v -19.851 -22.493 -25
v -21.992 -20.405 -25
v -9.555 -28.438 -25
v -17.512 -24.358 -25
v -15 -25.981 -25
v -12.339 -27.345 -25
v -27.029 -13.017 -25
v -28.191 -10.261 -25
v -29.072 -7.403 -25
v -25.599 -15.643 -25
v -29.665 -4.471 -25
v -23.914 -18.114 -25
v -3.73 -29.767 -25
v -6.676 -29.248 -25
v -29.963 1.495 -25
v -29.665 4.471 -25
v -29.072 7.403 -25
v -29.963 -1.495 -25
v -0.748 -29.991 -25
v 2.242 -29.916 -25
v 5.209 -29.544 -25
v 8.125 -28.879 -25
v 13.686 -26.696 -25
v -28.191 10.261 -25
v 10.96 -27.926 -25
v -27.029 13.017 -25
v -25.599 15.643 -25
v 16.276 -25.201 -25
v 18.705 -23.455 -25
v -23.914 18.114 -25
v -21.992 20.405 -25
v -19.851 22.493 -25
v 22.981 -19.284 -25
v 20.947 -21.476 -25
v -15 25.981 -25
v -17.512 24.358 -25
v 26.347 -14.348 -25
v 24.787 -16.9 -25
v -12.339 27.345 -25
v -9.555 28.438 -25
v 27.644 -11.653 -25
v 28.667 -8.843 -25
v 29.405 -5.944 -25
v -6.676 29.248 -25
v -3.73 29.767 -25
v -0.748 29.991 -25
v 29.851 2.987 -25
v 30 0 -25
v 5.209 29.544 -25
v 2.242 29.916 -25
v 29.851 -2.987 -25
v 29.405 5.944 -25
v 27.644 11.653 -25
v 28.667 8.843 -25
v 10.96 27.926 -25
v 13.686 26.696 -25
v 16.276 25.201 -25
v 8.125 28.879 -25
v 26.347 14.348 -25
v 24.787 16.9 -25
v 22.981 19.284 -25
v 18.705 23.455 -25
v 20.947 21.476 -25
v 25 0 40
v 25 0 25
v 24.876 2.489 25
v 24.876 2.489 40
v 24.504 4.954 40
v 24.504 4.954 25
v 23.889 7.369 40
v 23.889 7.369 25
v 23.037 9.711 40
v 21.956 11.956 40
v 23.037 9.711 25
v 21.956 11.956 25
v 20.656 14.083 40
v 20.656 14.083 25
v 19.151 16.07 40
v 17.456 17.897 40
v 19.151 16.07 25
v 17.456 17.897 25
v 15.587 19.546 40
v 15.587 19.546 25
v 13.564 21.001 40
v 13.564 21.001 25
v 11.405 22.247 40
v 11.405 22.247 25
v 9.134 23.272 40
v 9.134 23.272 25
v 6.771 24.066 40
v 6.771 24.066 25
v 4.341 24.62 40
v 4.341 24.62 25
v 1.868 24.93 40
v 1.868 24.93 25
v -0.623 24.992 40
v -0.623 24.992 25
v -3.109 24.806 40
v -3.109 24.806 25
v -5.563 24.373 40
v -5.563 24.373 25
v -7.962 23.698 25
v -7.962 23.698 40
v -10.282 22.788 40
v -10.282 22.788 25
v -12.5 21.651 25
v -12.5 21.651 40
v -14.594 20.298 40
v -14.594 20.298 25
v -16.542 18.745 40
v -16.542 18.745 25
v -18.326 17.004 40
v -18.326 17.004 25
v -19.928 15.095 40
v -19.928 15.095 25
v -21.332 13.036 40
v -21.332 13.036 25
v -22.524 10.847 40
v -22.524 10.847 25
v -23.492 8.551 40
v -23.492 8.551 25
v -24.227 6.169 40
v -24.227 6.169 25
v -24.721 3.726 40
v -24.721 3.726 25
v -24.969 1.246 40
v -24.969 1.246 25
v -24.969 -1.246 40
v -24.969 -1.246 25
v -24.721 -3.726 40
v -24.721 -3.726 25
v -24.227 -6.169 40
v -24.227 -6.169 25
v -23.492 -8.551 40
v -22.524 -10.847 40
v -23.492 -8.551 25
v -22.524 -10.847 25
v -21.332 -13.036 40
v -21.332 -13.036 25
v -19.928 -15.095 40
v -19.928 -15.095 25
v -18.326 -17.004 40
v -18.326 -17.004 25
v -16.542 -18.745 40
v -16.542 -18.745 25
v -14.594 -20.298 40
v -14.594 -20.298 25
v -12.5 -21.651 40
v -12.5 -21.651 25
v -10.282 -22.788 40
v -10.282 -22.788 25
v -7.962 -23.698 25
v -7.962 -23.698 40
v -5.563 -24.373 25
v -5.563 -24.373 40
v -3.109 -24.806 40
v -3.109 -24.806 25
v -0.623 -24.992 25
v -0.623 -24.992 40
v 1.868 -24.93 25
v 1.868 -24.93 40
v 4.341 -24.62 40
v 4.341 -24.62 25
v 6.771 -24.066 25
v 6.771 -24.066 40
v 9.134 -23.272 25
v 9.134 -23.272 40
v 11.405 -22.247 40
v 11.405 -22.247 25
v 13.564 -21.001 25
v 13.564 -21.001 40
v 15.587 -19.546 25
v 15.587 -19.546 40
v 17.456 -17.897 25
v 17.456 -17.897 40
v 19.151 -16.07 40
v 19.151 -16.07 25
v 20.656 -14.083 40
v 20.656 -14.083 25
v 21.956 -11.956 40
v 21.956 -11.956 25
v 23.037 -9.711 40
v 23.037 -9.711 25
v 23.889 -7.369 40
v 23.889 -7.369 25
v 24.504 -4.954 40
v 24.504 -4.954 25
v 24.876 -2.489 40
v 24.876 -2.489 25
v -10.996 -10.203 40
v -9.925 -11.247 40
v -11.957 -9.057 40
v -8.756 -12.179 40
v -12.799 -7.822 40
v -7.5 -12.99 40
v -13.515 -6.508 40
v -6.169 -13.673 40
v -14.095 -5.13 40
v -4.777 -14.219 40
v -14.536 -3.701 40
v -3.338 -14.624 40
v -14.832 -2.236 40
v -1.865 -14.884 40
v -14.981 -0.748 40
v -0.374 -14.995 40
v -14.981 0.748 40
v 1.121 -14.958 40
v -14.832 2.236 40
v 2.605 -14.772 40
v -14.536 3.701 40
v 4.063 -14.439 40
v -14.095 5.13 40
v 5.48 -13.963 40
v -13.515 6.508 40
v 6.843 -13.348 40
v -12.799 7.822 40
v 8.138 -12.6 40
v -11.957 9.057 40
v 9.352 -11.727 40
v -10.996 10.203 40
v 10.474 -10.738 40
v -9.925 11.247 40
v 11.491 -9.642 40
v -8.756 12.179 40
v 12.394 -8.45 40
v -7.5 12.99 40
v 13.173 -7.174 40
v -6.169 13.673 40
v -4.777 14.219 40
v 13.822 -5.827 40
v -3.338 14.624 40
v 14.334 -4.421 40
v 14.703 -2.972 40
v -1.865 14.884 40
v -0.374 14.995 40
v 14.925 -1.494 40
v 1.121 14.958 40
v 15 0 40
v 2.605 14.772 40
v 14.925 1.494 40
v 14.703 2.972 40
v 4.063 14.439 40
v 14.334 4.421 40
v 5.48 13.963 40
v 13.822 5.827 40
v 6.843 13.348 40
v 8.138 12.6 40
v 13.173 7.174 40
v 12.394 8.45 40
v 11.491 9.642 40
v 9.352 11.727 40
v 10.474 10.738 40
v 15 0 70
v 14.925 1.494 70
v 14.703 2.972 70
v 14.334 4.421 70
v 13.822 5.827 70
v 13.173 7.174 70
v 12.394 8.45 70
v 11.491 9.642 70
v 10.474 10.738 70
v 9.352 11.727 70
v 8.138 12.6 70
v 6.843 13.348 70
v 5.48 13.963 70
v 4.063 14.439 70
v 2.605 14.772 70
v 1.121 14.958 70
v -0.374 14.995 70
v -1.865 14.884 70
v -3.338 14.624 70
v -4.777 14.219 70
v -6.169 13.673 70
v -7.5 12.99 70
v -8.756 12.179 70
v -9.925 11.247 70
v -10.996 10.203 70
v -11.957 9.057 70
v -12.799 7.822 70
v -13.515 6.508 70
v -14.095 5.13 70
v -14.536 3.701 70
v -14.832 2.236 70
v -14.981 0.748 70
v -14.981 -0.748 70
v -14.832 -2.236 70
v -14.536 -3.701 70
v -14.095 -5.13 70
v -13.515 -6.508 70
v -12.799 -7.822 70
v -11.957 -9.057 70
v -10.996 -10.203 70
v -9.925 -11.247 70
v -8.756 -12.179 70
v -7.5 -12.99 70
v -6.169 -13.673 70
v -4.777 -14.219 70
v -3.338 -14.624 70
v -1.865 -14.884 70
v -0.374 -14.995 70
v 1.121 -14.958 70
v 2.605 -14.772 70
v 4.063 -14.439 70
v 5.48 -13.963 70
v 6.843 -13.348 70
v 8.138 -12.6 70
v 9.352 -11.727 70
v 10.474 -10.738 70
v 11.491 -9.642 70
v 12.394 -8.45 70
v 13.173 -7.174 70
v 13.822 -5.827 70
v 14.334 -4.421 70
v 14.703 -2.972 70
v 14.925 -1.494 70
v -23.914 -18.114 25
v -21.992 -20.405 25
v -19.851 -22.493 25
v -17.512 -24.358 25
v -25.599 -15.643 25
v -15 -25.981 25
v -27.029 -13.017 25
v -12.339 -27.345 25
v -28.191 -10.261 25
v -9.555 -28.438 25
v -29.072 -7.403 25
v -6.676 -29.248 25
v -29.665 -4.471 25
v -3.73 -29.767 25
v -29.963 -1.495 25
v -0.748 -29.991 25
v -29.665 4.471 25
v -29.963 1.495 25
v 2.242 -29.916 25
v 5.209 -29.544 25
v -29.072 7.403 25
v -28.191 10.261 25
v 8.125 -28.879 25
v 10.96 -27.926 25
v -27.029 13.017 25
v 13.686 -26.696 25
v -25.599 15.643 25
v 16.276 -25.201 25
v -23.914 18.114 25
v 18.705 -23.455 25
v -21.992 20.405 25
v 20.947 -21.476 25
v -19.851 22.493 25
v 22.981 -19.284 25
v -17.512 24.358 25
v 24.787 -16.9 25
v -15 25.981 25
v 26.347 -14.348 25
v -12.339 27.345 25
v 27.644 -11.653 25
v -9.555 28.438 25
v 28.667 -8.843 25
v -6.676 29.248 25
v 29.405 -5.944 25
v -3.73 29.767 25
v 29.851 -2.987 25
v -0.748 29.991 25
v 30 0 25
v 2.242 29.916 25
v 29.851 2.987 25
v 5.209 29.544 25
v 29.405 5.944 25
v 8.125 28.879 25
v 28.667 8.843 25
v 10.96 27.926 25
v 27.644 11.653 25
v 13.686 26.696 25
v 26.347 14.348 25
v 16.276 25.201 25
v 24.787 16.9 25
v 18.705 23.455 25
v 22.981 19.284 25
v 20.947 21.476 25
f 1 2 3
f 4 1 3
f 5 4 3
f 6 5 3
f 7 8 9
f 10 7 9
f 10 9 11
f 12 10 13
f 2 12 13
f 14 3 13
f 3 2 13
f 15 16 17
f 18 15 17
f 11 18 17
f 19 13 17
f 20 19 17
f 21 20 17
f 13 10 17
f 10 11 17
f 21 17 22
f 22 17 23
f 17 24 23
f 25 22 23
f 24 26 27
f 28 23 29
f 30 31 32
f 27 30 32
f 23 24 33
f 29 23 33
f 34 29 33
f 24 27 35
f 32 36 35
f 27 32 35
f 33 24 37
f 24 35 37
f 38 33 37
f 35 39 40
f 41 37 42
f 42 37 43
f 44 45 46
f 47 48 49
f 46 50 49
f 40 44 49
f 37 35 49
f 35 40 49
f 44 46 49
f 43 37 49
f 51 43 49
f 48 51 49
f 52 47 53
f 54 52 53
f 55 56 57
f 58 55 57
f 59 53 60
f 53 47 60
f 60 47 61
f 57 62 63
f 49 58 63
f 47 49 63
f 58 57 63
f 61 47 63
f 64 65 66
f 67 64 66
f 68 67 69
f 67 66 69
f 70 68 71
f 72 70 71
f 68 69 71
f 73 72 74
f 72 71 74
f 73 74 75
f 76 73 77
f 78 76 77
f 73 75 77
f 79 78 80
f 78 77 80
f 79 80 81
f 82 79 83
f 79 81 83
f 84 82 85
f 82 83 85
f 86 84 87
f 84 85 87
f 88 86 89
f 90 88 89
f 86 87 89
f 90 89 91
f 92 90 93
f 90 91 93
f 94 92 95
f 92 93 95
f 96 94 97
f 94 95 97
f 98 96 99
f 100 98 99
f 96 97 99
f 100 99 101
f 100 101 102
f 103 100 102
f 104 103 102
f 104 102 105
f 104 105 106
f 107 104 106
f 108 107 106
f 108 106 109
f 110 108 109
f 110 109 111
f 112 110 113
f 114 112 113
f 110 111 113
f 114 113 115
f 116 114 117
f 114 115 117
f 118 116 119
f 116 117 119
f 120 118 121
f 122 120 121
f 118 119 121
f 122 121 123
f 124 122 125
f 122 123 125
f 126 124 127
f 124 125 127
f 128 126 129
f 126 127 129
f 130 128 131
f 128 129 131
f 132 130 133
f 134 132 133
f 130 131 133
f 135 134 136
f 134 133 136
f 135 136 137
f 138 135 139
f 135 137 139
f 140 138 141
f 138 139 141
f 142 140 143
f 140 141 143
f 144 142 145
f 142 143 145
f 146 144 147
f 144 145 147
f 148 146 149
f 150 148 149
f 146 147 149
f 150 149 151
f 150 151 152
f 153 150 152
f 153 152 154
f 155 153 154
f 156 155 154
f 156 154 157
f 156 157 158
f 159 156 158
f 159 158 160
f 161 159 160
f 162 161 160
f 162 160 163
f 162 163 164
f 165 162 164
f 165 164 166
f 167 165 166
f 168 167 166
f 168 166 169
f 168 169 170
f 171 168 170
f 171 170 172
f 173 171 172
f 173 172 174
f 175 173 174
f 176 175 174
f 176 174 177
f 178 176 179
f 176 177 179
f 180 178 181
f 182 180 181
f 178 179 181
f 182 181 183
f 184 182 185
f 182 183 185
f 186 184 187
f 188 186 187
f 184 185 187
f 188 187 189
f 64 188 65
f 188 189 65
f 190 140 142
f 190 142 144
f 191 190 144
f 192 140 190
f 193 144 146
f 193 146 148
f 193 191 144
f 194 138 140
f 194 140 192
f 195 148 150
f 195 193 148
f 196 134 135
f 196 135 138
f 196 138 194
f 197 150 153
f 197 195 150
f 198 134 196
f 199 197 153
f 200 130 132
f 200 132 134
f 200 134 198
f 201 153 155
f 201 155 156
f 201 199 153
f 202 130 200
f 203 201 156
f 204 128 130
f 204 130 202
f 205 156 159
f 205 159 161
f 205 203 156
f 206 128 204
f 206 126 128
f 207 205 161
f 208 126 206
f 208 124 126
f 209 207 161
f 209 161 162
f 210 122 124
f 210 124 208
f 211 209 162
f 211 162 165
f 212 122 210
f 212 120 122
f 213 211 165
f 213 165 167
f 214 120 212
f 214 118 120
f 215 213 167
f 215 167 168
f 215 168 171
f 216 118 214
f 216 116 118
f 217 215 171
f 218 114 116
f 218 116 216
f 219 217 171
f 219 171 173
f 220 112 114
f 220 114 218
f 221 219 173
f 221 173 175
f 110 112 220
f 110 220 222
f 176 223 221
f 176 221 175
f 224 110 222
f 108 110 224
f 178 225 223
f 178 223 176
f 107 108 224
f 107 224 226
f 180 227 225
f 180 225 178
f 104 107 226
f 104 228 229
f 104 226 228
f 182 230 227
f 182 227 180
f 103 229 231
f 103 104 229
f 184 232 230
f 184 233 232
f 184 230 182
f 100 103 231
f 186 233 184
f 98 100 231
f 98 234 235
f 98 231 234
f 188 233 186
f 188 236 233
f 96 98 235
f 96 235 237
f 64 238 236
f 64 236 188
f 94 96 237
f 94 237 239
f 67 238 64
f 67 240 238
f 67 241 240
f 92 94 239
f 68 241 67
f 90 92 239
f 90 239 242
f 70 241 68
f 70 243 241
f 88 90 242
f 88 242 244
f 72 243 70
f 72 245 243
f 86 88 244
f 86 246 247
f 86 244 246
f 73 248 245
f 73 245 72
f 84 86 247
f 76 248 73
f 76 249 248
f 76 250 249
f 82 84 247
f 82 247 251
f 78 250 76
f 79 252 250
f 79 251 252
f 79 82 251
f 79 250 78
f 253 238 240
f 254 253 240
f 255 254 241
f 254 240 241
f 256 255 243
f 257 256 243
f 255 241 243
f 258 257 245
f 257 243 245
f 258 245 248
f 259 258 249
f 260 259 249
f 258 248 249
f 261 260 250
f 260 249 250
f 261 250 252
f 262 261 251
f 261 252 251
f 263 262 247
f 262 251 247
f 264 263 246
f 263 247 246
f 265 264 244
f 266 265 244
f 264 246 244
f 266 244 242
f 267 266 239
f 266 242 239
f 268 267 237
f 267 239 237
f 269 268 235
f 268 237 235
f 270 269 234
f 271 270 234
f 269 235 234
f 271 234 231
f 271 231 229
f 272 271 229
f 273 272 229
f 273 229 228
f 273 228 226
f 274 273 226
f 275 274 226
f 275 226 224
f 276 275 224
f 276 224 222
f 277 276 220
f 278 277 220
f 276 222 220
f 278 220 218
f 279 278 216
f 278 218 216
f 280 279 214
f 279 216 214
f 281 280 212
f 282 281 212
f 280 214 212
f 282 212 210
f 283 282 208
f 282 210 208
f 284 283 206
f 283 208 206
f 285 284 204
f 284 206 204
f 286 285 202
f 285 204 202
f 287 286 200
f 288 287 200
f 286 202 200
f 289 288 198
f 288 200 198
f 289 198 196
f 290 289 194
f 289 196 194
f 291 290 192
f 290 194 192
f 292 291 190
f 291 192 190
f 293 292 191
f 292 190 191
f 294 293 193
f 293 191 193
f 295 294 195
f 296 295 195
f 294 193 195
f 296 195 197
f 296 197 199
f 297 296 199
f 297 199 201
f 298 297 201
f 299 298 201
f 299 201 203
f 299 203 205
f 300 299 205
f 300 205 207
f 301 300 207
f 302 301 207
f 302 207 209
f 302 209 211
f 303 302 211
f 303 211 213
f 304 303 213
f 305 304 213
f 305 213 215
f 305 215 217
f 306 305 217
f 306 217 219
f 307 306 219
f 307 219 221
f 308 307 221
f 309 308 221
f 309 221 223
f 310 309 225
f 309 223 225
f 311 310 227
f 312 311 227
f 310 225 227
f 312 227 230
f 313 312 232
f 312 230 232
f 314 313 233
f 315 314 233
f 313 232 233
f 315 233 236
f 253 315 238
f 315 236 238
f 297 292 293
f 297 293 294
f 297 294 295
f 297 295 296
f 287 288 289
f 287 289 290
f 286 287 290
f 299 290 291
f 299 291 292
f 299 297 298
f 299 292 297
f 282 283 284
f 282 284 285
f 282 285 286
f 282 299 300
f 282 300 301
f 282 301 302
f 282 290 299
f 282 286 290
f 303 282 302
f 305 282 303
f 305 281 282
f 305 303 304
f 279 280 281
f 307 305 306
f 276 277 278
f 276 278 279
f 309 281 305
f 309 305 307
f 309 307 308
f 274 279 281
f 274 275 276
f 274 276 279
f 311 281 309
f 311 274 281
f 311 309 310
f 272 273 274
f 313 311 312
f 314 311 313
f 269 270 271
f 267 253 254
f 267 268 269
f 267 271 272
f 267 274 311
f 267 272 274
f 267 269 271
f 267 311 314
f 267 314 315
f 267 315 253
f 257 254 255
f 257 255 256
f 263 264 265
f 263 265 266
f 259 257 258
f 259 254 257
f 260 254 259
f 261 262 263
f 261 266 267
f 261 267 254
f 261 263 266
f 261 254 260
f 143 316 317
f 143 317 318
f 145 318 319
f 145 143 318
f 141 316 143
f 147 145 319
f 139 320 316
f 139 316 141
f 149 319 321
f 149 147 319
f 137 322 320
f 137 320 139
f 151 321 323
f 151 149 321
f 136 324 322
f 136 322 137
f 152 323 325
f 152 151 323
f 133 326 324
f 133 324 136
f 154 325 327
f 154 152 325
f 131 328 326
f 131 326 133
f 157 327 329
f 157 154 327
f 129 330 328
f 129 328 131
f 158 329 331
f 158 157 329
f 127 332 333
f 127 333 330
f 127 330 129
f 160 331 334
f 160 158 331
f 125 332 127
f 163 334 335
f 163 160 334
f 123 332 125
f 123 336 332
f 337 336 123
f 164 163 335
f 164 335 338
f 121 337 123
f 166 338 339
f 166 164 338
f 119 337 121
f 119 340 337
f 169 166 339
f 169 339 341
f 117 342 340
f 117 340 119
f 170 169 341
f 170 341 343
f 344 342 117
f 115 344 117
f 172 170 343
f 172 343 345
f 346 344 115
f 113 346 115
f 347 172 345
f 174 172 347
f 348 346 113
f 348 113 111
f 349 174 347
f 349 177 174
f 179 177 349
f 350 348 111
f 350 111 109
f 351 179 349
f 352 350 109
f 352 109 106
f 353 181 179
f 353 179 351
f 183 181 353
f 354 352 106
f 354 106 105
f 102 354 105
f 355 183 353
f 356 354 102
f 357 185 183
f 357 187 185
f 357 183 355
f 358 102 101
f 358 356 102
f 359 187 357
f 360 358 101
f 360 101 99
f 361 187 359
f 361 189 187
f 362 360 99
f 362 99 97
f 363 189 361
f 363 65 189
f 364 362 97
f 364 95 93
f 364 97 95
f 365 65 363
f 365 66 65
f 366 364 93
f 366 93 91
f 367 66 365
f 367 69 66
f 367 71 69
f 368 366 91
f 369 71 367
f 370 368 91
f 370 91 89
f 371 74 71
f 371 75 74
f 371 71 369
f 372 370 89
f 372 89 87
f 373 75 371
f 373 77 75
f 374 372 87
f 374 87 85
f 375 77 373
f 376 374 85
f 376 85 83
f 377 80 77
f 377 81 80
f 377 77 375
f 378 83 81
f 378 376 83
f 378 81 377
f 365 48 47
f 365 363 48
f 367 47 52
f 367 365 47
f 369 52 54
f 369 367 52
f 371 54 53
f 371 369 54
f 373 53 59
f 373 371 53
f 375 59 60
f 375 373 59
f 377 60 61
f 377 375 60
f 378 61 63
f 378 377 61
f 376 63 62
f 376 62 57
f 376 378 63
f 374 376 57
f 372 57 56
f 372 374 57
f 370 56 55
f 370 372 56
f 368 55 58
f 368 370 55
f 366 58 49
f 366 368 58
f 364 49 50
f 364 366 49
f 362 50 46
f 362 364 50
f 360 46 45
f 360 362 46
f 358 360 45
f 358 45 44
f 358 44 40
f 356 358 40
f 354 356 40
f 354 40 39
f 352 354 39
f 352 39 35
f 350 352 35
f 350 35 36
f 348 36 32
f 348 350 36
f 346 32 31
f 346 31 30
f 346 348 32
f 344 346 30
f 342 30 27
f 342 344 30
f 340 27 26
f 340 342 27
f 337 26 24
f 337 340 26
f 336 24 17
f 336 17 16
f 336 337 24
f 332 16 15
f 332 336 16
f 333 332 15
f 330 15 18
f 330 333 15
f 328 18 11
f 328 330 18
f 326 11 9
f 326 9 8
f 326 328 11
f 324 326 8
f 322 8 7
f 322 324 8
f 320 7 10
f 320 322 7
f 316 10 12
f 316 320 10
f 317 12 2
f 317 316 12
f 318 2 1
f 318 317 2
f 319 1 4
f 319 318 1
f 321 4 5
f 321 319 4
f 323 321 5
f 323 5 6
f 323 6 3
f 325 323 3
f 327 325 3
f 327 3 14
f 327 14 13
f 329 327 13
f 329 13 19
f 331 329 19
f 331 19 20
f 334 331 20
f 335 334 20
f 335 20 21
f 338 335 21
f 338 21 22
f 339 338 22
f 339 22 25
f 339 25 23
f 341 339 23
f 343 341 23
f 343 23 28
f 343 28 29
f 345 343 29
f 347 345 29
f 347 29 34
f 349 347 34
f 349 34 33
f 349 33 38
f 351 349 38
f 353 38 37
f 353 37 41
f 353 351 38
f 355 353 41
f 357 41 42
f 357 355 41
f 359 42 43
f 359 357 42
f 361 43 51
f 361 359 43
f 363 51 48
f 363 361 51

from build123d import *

# Parameters (mm, degrees)
SKETCH_1_R      = 30
EXTRUDE_1_DEPTH = 25
SKETCH_3_R      = 25
EXTRUDE_2_DEPTH = 15
SKETCH_4_R      = 15
EXTRUDE_3_DEPTH = 30


with BuildPart() as part:
    # 草图1 → 凸台-拉伸1 (new body, symmetric)
    with BuildSketch(Plane.XY):
        Circle(SKETCH_1_R)
    extrude(amount=EXTRUDE_1_DEPTH, both=True)

    # 草图3 → 凸台-拉伸2 (add)
    with BuildSketch(Plane.XY.offset(25)):
        Circle(SKETCH_3_R)
    extrude(amount=EXTRUDE_2_DEPTH)

    # 草图4 → 凸台-拉伸3 (add)
    with BuildSketch(Plane.XY.offset(40)):
        Circle(SKETCH_4_R)
    extrude(amount=EXTRUDE_3_DEPTH)


solid = part.part
